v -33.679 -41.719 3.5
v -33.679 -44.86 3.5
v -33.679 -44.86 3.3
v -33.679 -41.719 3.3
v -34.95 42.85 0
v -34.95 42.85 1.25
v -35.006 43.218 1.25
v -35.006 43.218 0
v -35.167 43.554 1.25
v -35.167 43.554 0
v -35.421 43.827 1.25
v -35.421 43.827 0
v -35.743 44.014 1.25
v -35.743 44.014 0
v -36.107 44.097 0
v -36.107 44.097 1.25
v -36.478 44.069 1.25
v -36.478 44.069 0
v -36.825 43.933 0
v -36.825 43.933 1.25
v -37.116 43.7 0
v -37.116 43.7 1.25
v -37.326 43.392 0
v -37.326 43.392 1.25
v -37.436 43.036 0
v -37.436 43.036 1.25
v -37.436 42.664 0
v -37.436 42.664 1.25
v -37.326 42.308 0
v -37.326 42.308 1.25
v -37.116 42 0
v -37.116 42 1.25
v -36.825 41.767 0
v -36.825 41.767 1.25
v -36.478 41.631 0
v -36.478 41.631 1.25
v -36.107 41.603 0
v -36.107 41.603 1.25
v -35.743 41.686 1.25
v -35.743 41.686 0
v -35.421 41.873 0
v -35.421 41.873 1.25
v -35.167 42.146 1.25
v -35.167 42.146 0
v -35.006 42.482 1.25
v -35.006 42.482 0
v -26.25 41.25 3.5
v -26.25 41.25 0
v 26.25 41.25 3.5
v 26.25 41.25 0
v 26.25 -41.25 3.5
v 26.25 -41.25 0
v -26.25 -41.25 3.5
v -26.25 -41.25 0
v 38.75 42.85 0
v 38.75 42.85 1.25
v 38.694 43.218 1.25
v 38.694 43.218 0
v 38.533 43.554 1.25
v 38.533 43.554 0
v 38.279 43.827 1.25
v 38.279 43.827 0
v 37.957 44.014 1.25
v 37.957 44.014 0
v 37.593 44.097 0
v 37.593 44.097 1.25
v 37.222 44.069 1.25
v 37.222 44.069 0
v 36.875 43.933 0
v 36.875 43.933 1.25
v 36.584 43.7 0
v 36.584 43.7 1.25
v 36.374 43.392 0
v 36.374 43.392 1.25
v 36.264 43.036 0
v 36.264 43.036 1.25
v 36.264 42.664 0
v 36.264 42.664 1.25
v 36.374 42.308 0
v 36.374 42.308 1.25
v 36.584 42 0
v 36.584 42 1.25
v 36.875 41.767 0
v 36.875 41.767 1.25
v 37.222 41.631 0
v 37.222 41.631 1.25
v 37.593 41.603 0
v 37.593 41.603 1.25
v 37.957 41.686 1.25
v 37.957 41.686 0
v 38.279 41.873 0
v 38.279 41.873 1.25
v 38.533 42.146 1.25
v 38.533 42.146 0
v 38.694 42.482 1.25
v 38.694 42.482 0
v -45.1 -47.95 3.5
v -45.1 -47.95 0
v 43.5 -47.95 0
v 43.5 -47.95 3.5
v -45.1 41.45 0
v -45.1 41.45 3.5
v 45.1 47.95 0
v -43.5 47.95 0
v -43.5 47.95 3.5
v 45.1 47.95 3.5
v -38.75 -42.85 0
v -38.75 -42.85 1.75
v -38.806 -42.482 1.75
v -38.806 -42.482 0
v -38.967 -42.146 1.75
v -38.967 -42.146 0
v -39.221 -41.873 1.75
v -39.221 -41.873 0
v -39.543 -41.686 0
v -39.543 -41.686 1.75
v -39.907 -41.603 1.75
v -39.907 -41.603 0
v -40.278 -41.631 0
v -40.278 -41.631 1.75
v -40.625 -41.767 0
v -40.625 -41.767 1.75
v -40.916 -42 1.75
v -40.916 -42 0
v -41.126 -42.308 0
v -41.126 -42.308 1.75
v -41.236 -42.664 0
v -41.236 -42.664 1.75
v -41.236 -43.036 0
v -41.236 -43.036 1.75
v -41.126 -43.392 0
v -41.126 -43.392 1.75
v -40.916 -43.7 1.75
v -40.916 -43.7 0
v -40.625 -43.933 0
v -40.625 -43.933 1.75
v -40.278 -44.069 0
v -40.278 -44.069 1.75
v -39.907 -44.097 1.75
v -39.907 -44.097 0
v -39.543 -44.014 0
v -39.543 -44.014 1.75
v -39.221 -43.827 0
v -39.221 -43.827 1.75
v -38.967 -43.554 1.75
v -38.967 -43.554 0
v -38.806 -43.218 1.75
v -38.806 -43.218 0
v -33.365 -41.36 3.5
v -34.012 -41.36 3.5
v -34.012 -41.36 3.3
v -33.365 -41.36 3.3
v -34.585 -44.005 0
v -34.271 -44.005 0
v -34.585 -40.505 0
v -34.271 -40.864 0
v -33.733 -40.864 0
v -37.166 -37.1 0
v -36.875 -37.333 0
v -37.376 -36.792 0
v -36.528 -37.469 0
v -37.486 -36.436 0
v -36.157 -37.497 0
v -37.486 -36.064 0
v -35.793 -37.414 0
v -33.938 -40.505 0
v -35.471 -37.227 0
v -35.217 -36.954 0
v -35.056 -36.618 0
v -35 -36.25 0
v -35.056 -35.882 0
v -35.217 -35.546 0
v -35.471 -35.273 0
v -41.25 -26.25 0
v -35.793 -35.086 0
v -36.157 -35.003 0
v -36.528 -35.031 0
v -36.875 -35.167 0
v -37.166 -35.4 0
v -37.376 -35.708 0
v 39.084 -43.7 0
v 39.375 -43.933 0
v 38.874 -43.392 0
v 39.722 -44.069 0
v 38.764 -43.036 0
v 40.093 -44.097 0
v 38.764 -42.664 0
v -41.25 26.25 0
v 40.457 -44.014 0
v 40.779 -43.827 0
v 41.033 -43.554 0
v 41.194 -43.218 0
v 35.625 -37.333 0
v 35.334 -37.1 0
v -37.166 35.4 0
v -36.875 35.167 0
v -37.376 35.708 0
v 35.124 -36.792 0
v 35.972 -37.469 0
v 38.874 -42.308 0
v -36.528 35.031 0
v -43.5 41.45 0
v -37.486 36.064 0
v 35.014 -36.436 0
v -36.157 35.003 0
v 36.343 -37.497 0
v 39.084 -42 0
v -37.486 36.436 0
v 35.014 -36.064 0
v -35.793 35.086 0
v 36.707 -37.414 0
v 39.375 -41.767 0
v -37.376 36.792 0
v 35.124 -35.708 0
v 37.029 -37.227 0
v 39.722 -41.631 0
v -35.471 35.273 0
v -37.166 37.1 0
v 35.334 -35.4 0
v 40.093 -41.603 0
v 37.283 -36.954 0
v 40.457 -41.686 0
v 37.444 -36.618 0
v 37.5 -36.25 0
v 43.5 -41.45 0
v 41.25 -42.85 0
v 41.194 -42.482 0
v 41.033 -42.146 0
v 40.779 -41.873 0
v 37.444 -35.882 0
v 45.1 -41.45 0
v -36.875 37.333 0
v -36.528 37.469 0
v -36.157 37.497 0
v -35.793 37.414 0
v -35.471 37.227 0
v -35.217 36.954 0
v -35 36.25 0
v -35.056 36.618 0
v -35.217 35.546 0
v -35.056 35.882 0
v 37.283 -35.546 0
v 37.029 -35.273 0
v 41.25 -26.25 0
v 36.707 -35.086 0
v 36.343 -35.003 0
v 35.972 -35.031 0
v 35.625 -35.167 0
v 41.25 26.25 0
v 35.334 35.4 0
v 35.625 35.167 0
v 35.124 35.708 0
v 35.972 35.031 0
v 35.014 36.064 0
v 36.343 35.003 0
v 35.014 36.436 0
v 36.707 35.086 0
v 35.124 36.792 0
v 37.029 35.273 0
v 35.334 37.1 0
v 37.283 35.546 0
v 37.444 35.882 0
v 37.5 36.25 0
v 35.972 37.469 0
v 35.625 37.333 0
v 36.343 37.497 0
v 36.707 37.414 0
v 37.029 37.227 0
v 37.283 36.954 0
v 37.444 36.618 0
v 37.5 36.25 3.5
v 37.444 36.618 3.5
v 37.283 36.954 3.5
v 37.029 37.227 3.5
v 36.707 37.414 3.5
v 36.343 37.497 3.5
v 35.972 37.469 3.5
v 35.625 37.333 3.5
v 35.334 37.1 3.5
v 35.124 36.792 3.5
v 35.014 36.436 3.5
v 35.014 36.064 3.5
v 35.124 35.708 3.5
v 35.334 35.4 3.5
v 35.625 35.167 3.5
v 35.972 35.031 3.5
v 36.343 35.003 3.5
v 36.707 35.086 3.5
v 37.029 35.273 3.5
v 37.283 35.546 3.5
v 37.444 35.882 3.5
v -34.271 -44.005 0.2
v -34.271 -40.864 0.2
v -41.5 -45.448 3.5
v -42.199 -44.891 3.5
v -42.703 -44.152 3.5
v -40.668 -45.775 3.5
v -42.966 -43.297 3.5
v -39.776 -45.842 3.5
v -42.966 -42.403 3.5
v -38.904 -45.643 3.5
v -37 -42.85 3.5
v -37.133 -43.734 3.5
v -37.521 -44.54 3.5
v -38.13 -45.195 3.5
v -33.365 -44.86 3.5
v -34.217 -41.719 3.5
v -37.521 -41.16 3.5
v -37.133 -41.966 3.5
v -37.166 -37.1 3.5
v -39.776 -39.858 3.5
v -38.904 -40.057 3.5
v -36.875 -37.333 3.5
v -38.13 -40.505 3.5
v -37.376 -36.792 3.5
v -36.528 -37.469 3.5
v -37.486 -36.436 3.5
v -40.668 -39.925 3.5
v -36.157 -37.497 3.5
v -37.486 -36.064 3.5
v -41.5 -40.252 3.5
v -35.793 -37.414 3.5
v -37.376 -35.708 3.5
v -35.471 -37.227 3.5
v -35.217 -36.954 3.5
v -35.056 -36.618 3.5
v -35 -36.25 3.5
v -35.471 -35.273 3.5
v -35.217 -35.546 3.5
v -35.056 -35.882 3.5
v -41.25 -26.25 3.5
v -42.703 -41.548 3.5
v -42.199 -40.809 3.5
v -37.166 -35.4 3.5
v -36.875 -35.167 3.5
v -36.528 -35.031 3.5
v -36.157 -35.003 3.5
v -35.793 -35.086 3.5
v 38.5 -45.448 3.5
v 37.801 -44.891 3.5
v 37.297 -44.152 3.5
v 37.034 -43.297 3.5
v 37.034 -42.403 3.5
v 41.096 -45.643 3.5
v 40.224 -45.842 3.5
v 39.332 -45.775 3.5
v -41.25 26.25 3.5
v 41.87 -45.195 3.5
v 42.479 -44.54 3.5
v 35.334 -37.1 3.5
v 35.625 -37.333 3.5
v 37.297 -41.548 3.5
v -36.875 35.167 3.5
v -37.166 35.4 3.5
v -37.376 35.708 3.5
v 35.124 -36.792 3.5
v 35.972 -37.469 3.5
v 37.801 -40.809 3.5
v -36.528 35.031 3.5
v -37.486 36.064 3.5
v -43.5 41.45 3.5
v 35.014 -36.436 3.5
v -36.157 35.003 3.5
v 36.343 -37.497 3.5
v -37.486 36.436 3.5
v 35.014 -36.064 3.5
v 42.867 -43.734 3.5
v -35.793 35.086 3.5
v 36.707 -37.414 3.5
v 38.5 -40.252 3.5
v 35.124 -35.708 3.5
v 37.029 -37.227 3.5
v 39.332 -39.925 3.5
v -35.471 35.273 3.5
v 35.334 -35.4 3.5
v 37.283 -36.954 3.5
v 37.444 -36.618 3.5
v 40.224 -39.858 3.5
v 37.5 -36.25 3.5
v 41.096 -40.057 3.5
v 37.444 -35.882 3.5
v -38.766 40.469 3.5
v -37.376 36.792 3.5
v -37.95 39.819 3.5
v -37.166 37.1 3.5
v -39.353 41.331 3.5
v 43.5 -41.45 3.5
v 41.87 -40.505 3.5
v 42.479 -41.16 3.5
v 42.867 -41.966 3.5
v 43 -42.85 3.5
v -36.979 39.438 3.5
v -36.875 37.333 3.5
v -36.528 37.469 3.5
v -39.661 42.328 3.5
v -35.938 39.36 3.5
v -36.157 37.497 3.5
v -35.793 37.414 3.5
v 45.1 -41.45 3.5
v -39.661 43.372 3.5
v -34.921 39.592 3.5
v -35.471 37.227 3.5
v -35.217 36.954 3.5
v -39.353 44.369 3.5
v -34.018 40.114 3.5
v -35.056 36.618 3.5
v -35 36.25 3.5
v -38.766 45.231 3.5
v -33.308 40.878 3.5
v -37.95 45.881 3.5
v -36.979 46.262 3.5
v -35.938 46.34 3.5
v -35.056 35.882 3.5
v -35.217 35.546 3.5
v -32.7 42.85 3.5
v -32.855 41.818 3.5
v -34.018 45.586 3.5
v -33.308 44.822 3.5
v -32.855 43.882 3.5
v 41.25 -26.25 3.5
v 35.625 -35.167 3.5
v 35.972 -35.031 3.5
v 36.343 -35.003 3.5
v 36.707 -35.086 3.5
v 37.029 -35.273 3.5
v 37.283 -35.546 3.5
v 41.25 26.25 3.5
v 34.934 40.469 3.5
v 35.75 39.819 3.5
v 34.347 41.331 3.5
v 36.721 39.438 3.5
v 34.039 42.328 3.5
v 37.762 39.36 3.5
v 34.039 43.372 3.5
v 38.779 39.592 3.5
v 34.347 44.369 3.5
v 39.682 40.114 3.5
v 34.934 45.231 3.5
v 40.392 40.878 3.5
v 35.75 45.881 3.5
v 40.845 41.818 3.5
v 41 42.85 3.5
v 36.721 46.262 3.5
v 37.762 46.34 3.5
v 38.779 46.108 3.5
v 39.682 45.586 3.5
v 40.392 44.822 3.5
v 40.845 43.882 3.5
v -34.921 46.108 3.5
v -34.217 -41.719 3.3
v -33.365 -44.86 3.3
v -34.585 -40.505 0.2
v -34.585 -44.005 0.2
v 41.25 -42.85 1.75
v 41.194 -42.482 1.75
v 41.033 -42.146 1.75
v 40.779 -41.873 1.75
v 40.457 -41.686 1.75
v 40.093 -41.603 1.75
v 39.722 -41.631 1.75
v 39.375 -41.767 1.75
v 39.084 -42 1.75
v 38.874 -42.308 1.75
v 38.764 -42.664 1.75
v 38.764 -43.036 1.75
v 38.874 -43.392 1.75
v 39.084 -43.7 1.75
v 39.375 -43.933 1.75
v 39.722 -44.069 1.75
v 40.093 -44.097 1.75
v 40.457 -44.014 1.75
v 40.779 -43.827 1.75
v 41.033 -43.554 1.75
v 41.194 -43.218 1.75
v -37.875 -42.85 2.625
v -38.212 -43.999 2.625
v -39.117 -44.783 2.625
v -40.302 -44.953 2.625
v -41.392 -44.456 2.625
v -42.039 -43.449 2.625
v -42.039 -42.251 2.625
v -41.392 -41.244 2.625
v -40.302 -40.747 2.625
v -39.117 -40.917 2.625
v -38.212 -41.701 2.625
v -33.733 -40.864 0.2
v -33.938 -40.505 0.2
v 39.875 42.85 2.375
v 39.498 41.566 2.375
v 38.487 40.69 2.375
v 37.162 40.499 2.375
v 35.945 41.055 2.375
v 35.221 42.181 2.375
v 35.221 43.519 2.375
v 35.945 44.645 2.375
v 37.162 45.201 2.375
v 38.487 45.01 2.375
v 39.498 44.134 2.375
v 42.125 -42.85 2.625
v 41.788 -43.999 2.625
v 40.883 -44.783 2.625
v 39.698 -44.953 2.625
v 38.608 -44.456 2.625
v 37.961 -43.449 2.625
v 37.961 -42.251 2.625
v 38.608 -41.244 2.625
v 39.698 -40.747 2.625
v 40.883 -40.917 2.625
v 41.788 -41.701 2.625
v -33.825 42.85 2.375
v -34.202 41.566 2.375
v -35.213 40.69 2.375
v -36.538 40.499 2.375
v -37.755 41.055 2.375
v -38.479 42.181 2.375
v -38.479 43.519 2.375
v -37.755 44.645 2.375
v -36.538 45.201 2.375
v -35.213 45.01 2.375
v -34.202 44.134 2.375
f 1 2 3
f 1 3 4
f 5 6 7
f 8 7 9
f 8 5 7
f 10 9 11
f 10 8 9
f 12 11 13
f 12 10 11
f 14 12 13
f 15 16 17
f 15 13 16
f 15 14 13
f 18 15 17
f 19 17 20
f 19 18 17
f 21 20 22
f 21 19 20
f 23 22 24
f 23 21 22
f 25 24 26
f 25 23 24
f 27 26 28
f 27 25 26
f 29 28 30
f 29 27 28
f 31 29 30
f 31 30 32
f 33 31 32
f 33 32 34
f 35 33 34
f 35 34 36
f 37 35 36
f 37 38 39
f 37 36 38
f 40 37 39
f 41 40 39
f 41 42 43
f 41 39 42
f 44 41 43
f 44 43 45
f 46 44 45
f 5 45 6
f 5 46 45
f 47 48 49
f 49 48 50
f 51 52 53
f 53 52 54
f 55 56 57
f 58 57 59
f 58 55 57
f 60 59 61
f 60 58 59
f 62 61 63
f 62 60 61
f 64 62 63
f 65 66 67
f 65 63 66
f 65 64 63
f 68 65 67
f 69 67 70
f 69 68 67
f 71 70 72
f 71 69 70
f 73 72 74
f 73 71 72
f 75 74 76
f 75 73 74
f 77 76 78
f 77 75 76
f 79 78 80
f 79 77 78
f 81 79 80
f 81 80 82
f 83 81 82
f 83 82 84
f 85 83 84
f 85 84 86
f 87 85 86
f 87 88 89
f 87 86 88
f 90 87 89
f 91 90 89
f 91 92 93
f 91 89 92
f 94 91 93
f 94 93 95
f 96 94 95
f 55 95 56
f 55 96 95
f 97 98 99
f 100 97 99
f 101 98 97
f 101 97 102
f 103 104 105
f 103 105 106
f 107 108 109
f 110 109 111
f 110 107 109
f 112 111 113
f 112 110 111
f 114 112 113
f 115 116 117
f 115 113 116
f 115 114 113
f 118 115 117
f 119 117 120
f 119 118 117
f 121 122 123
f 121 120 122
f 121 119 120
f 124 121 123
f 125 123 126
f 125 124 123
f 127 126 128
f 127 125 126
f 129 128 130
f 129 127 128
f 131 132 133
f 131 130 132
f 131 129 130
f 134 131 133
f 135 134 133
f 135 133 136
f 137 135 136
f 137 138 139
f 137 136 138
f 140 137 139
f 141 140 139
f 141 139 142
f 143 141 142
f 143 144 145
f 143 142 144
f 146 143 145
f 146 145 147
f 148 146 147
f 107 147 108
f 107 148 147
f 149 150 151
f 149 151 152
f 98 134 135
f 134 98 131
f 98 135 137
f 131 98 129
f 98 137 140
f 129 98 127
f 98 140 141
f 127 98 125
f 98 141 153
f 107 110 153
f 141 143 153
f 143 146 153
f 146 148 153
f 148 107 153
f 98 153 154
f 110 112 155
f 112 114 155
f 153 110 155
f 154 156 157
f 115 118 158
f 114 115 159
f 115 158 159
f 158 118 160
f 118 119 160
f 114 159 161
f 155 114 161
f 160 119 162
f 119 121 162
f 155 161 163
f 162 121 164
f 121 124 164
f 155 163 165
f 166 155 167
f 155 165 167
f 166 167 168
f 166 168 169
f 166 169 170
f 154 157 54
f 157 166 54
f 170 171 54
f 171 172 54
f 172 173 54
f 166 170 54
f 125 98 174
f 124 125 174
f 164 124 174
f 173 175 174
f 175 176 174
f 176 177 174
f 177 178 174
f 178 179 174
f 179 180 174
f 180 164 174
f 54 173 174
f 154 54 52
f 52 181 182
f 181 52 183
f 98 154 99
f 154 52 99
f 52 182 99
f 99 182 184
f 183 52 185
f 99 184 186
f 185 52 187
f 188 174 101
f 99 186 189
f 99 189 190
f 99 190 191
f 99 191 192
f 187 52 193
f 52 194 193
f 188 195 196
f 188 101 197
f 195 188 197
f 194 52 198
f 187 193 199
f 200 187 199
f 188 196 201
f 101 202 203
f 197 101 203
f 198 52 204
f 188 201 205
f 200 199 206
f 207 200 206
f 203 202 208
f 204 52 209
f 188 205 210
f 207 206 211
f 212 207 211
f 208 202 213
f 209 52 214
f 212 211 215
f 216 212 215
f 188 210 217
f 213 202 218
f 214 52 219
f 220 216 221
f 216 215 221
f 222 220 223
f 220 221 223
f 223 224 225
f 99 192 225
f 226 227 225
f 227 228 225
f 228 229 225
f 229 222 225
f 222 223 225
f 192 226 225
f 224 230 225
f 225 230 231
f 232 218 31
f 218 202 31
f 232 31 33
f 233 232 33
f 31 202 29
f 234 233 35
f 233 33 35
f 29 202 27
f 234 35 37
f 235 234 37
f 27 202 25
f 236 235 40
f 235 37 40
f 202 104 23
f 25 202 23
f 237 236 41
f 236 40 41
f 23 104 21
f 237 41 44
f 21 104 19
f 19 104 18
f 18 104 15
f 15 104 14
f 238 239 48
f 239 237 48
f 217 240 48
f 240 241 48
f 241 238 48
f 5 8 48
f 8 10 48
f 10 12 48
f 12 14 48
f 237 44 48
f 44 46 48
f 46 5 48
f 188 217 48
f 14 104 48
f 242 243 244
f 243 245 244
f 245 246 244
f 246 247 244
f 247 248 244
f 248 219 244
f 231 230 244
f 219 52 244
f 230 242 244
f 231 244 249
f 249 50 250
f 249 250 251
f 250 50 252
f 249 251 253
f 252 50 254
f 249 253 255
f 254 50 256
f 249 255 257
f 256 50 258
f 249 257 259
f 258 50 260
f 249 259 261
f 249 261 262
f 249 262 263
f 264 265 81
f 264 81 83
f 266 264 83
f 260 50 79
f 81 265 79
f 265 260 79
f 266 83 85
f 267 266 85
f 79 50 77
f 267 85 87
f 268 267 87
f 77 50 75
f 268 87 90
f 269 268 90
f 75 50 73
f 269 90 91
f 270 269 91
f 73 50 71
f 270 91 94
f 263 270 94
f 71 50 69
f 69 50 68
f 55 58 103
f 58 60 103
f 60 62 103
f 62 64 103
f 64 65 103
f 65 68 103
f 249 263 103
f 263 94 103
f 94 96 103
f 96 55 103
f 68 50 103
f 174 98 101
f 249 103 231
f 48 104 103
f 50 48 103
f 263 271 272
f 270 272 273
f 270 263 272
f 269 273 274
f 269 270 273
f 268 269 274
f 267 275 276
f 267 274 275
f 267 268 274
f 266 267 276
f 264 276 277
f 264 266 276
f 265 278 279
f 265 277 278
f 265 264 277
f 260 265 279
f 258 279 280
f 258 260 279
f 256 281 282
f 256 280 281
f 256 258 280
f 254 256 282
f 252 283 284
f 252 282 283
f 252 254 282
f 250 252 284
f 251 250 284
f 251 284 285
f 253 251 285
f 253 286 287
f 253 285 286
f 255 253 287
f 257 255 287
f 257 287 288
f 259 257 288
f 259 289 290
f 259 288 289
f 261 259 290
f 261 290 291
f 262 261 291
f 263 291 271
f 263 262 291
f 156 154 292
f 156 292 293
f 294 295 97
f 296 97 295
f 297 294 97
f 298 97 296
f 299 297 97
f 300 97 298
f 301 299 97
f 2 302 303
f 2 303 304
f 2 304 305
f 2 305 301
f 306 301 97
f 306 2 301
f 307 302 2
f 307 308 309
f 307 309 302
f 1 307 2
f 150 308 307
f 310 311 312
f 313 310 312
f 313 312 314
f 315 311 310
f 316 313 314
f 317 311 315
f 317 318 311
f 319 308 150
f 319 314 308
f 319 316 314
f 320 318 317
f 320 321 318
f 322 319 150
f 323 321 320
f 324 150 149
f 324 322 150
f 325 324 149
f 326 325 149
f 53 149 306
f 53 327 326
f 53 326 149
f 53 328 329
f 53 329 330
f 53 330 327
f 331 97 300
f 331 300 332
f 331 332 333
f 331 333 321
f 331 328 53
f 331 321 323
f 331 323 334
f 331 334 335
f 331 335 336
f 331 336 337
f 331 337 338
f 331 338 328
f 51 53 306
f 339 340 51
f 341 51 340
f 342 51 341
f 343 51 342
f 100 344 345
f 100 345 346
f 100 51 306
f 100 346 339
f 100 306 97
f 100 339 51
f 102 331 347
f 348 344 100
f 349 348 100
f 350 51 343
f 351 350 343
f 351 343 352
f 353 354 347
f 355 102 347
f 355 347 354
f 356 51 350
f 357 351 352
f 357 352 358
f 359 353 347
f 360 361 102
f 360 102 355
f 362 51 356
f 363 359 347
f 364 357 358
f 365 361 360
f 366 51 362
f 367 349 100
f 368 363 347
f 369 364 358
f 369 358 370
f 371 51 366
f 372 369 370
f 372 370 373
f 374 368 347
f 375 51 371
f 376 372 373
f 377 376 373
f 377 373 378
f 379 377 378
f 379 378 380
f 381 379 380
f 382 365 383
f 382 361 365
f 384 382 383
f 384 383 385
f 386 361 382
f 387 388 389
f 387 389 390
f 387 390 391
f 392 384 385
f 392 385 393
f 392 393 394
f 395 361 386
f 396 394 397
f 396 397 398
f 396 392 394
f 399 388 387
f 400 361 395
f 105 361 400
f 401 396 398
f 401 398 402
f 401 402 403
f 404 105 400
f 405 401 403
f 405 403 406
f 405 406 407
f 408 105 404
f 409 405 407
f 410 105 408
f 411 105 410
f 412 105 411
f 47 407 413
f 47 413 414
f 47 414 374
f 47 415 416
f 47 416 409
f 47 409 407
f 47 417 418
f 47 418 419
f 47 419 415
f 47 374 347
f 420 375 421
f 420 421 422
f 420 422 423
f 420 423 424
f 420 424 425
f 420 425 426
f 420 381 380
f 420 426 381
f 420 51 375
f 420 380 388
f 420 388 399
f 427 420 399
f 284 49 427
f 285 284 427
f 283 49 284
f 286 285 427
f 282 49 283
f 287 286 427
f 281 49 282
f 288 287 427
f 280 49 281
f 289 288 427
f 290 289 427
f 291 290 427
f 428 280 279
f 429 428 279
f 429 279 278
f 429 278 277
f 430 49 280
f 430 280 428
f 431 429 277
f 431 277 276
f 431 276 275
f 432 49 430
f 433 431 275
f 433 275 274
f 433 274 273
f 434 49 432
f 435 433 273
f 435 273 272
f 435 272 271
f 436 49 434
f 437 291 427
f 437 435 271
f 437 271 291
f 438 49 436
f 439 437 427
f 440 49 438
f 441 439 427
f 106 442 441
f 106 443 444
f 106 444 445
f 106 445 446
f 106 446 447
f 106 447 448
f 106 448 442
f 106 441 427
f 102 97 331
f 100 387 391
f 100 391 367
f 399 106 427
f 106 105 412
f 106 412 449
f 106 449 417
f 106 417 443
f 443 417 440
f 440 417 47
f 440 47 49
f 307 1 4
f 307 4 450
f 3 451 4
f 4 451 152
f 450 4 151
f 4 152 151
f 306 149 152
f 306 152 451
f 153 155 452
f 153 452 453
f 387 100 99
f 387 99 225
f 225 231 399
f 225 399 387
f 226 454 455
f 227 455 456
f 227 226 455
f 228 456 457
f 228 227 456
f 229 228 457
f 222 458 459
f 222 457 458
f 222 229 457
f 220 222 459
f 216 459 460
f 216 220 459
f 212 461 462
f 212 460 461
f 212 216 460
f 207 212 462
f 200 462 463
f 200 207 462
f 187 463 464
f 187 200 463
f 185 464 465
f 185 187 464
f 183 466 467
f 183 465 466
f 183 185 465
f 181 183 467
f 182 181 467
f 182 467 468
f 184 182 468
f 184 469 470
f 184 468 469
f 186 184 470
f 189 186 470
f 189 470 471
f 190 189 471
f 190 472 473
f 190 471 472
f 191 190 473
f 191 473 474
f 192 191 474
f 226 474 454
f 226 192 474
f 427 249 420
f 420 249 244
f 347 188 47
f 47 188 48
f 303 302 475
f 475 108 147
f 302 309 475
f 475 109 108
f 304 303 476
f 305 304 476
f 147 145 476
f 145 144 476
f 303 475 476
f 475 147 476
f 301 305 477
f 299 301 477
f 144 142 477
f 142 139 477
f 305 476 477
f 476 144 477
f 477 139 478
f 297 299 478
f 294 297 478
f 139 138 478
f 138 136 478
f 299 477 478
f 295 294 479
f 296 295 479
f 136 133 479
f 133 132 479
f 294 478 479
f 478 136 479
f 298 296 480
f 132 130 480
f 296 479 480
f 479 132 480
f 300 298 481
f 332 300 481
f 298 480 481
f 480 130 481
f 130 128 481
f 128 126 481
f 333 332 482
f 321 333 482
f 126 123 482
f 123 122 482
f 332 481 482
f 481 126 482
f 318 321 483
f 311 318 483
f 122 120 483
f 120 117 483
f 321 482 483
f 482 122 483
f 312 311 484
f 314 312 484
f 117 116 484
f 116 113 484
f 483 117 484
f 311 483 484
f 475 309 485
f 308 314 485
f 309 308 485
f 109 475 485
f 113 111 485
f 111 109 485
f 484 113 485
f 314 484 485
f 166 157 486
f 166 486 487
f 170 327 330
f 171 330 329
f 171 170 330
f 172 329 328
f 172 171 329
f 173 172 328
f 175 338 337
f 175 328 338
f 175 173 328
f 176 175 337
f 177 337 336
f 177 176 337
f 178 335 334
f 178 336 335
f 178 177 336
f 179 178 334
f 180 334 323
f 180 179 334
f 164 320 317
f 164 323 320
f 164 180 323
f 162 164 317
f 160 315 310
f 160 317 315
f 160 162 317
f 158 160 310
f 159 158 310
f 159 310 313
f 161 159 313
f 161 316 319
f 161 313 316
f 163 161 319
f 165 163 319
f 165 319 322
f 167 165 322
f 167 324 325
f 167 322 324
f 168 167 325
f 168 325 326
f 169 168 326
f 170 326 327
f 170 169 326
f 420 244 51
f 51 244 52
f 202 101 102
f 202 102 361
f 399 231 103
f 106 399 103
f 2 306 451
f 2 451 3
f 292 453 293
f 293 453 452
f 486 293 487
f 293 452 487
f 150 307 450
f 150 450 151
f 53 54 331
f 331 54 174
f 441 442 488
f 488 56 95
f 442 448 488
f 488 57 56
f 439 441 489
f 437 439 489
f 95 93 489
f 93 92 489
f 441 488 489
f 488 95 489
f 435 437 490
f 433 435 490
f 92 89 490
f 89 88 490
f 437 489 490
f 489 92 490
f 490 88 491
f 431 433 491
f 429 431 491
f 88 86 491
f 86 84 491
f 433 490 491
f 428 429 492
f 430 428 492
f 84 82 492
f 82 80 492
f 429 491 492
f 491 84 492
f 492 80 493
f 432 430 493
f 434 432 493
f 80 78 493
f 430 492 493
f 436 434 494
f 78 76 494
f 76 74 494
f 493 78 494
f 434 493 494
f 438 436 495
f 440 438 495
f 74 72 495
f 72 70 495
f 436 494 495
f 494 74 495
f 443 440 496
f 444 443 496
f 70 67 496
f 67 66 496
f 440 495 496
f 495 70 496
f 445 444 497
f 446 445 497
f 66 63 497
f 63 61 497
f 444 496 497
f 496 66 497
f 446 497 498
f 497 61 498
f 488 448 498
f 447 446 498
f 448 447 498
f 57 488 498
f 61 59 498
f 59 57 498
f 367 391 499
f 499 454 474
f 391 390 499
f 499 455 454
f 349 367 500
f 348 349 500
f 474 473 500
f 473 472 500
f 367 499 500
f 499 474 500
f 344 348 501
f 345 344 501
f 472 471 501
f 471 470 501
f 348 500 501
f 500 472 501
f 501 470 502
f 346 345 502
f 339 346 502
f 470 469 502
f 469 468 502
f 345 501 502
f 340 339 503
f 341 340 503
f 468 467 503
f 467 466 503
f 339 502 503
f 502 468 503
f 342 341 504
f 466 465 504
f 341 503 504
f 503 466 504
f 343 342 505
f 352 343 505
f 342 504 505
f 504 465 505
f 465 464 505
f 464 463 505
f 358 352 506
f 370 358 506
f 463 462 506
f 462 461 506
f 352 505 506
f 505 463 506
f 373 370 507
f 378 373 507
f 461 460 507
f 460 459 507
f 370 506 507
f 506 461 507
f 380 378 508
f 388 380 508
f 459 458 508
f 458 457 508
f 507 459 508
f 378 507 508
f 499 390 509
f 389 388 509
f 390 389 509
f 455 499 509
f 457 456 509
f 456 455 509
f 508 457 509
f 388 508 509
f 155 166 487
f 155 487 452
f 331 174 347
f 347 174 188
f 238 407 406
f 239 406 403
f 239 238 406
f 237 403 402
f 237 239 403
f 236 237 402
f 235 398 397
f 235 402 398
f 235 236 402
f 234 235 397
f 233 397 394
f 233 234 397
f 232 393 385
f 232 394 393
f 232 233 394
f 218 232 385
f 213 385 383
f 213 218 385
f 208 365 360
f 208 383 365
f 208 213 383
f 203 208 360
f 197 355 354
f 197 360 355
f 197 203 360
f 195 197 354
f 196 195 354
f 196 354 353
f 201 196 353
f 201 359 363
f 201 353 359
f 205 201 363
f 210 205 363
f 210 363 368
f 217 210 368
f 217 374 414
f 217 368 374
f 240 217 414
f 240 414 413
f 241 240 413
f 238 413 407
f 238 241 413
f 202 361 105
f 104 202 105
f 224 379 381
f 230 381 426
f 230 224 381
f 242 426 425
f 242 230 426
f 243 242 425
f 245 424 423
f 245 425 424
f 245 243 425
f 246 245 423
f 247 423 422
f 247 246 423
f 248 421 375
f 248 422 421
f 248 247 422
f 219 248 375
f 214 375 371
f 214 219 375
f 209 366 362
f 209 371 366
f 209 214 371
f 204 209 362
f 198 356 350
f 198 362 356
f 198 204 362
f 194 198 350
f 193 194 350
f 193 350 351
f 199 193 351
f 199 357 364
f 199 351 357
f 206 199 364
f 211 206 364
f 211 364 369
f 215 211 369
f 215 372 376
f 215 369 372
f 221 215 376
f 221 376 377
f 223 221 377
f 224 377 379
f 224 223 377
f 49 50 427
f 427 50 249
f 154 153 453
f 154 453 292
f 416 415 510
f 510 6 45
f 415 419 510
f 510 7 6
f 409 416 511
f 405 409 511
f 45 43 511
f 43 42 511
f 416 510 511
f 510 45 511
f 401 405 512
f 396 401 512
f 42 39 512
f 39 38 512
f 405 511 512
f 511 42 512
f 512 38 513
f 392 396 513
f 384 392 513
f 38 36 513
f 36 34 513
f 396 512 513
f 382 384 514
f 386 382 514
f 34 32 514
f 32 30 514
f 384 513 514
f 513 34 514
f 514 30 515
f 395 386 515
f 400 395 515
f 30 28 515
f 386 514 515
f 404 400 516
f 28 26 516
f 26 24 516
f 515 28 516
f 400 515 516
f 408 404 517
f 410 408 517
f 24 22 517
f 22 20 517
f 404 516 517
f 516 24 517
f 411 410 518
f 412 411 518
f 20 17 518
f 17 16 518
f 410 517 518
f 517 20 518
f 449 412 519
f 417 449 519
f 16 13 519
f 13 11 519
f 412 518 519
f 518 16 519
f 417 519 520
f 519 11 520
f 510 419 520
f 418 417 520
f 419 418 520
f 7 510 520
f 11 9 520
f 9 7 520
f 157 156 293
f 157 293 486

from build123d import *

# Parameters (mm, degrees)
ESBO_O1_W                  = 90.2
ESBO_O1_H                  = 95.9
RESSALTO_EXTRUS_O1_DEPTH   = 3.5
ESBO_O2_R                  = 1.25
CORTE_EXTRUS_O1_DEPTH      = 5
CORTE_EXTRUS_O3_DEPTH      = 5
ESBO_O4_R                  = 1.25
CORTE_EXTRUS_O2_DEPTH      = 10
CHANFRO4_SIZE              = 1.75
CHANFRO5_SIZE              = 1.75
CHANFRO6_SIZE              = 2.25
CHANFRO7_SIZE              = 2.25
CORTE_EXTRUS_O4_DEPTH      = 0.2
CORTE_EXTRUS_O5_DEPTH      = 0.2
CORTE_EXTRUS_O7_DEPTH      = 66.920122118
CORTE_EXTRUS_O7_DEPTH_BACK = 5
ESBO_O7_W                  = 1.6
ESBO_O7_H                  = 6.5
ESBO_O8_W                  = 1.6
ESBO_O8_H                  = 6.5
CORTE_EXTRUS_O8_DEPTH      = 5


with BuildPart() as part:
    # Esboço1 → Ressalto-extrusão1 (new body)
    with BuildSketch(Plane.XY):
        Rectangle(ESBO_O1_W, ESBO_O1_H)
    extrude(amount=RESSALTO_EXTRUS_O1_DEPTH)

    # Esboço2 → Corte-extrusão1 (cut)
    with BuildSketch(Plane.XY):
        with Locations((-36.2, 42.85)):
            Circle(ESBO_O2_R)
        with Locations((37.5, 42.85)):
            Circle(ESBO_O2_R)
        with Locations((40, -42.85)):
            Circle(ESBO_O2_R)
        with Locations((-40, -42.85)):
            Circle(ESBO_O2_R)
    extrude(amount=CORTE_EXTRUS_O1_DEPTH, mode=Mode.SUBTRACT)

    # Esboço3 → Corte-extrusão3 (cut)
    with BuildSketch(Plane.XY):
        Polygon((-26.25, 41.25), (26.25, 41.25), (41.25, 26.25), (41.25, -26.25), (26.25, -41.25), (-26.25, -41.25), (-41.25, -26.25), (-41.25, 26.25), align=None)
    extrude(amount=CORTE_EXTRUS_O3_DEPTH, mode=Mode.SUBTRACT)

    # Esboço4 → Corte-extrusão2 (cut)
    with BuildSketch(Plane.XY):
        with Locations((-36.25, 36.25)):
            Circle(ESBO_O4_R)
        with Locations((36.25, 36.25)):
            Circle(ESBO_O4_R)
        with Locations((-36.25, -36.25)):
            Circle(ESBO_O4_R)
        with Locations((36.25, -36.25)):
            Circle(ESBO_O4_R)
    extrude(amount=CORTE_EXTRUS_O2_DEPTH, mode=Mode.SUBTRACT)

    # Chanfro4
    chanfro4_edges = [part.edges().sort_by_distance(p)[0] for p in [
        (-41.25, -42.85, 3.5),
    ]]
    chamfer(chanfro4_edges, length=CHANFRO4_SIZE)

    # Chanfro5
    chanfro5_edges = [part.edges().sort_by_distance(p)[0] for p in [
        (38.75, -42.85, 3.5),
    ]]
    chamfer(chanfro5_edges, length=CHANFRO5_SIZE)

    # Chanfro6
    chanfro6_edges = [part.edges().sort_by_distance(p)[0] for p in [
        (-37.45, 42.85, 3.5),
    ]]
    chamfer(chanfro6_edges, length=CHANFRO6_SIZE)

    # Chanfro7
    chanfro7_edges = [part.edges().sort_by_distance(p)[0] for p in [
        (36.25, 42.85, 3.5),
    ]]
    chamfer(chanfro7_edges, length=CHANFRO7_SIZE)

    # Esboço5 → Corte-extrusão4 (cut)
    with BuildSketch(Plane.XY.offset(3.5)):
        Polygon((-34.011664728, -41.359633286), (-33.364529311, -41.359633286), (-33.364529311, -44.859633286), (-33.678631875, -44.859633286), (-33.678631875, -41.718607645), (-34.217093414, -41.718607645), align=None)
    extrude(amount=-CORTE_EXTRUS_O4_DEPTH, mode=Mode.SUBTRACT)

    # Esboço6 → Corte-extrusão5 (cut)
    with BuildSketch(Plane(origin=(0, 0, 0), x_dir=(-1, 0, 0), z_dir=(0, 0, -1))):
        Polygon((33.93825461, -40.504659527), (34.585390027, -40.504659527), (34.585390027, -44.004659527), (34.271287463, -44.004659527), (34.271287463, -40.863633886), (33.732825924, -40.863633886), align=None)
    extrude(amount=-CORTE_EXTRUS_O5_DEPTH, mode=Mode.SUBTRACT)

    # Esboço7 → Corte-extrusão7 (cut, two sides: drawn at the far end of the back side and taken through both)
    with BuildSketch(Plane(origin=(0, 0, 0), x_dir=(-1, 0, 0), z_dir=(0, 0, -1)).offset(-CORTE_EXTRUS_O7_DEPTH_BACK)):
        with Locations((-44.3, -44.7)):
            Rectangle(ESBO_O7_W, ESBO_O7_H)
    extrude(amount=CORTE_EXTRUS_O7_DEPTH + CORTE_EXTRUS_O7_DEPTH_BACK, mode=Mode.SUBTRACT)

    # Esboço8 → Corte-extrusão8 (cut)
    with BuildSketch(Plane.XY.offset(3.5)):
        with Locations((-44.3, 44.7)):
            Rectangle(ESBO_O8_W, ESBO_O8_H)
    extrude(amount=-CORTE_EXTRUS_O8_DEPTH, mode=Mode.SUBTRACT)


solid = part.part
